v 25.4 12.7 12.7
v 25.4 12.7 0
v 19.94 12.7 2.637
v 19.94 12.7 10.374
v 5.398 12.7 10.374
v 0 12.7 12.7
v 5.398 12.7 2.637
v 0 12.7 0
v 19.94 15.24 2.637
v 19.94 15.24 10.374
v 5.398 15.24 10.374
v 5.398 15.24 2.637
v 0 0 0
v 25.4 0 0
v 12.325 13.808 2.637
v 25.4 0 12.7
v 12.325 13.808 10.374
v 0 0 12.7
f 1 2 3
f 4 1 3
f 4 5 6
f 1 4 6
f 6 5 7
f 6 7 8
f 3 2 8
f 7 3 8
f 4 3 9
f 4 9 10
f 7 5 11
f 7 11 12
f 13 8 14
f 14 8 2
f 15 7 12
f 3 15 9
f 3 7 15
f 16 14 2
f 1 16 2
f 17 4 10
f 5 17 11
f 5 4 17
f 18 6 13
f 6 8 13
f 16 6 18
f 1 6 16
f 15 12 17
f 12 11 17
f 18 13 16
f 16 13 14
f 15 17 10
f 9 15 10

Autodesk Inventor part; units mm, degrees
ref_plane "YZ Plane" through (0, 0, 0) normal (1, 0, 0) x (0, 1, 0)
ref_plane "XZ Plane" through (0, 0, 0) normal (0, 1, 0) x (-1, 0, 0)
ref_plane "XY Plane" through (0, 0, 0) normal (0, 0, 1) x (1, 0, 0)
sketch "Sketch1" plane through (0, 0, 0) normal (0, 0, 1) x (1, 0, 0)
  line L0 (0, 0) -> (25.4, 0)
  line L1 (25.4, 0) -> (25.4, 12.7)
  line L2 (25.4, 12.7) -> (0, 12.7)
  line L3 (0, 12.7) -> (0, 0)
  dimension "d0" = 25.4
  dimension "d1" = 12.7
extrude "Extrusion1" add sketch "Sketch1" along normal blind 12.7
sketch "Sketch2" plane through (0, 12.7, 0) normal (0, 1, 0) x (1, 0, 0)
  line L0 (5.398, -2.6368) -> (19.9399, -2.6368)
  line L1 (19.9399, -2.6368) -> (19.9399, -10.3739)
  line L2 (19.9399, -10.3739) -> (5.398, -10.3739)
  line L3 (5.398, -10.3739) -> (5.398, -2.6368)
extrude "Extrusion2" add sketch "Sketch2" along normal blind 2.54
sketch "Sketch3" plane through (5.398, 12.7, 10.3739) normal (0, 0, 1) x (1, 0, 0)
  line L0 (14.5419, 2.54) -> (0, 2.54) projected
  line L1 (0, 2.54) -> (6.9268, 1.1079)
  line L2 (6.9268, 1.1079) -> (14.5419, 2.54)
  point P0 (-5.398, -12.7)
extrude "Extrusion3" cut sketch "Sketch3" against normal blind 50.8
properties part number "Switch"
